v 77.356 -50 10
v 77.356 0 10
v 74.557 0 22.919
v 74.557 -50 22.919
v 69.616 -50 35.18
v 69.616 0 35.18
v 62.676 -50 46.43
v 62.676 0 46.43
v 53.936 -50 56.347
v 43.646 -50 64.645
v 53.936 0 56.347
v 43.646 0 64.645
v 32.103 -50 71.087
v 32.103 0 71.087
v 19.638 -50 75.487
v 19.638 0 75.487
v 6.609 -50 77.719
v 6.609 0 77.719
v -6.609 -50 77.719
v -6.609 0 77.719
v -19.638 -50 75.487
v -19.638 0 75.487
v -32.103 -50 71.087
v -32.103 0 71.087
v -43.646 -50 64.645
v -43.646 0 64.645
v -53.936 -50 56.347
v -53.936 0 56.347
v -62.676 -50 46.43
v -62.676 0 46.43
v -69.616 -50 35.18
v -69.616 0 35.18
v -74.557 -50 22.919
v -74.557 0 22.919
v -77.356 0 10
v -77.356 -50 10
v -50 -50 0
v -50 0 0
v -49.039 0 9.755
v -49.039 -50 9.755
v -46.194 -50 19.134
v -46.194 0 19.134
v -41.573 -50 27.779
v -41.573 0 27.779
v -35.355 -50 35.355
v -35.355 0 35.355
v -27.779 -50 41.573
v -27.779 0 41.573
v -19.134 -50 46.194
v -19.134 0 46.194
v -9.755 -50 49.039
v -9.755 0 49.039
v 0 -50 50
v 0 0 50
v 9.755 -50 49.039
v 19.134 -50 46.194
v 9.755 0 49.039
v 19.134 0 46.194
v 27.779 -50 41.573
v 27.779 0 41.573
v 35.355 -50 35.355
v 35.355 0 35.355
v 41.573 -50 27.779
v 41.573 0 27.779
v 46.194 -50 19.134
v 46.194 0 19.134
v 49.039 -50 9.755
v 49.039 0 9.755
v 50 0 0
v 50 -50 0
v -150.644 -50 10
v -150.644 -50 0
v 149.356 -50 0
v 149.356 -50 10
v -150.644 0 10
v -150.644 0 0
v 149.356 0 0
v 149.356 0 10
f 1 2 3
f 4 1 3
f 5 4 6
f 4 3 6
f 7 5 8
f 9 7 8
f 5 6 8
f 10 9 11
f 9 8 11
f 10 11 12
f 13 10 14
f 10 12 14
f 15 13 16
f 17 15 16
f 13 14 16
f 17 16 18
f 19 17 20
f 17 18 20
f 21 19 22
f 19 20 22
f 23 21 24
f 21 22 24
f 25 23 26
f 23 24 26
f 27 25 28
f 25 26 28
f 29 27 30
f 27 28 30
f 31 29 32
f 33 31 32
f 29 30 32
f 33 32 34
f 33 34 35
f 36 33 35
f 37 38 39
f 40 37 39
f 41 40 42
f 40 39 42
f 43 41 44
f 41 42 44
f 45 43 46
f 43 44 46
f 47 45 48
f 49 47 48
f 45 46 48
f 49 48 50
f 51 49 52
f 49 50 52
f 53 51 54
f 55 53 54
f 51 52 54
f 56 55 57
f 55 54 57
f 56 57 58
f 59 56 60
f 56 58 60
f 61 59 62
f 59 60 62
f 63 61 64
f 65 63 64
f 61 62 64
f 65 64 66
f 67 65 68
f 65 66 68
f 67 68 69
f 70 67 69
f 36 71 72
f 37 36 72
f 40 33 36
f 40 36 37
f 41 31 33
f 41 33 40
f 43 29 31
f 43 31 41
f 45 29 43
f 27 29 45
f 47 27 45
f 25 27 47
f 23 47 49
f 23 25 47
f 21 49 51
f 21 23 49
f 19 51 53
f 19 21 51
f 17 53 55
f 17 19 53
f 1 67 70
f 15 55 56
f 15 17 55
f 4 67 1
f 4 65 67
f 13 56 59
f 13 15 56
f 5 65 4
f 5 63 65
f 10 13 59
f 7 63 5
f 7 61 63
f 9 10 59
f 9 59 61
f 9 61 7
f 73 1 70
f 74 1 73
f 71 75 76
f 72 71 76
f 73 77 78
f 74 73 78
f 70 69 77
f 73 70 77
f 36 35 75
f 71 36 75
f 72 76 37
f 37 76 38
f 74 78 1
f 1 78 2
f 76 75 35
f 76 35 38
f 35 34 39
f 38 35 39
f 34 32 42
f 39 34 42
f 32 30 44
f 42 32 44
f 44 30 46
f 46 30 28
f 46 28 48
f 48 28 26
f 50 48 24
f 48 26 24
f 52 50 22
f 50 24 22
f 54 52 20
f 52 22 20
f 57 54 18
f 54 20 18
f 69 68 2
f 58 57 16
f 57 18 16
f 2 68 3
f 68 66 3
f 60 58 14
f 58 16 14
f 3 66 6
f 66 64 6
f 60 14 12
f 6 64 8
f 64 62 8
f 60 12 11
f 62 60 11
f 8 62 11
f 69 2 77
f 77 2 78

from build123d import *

# Parameters (mm, degrees)
F1_DEPTH = 50


with BuildPart() as f1:
    # F0 (on Front) → F1 (new body)
    with BuildSketch(Plane.XZ):
        with BuildLine():
            Line((-78, 0), (-50, 0))
            ThreePointArc((-50, 0), (0, 50), (50, 0))
            Line((50, 0), (149.356318, 0))
            Line((149.356318, 0), (149.356318, 10))
            Line((149.356318, 10), (77.356318, 10))
            ThreePointArc((77.356318, 10), (0, 78), (-77.356318, 10))
            Line((-77.356318, 10), (-150.643682, 10))
            Line((-150.643682, 10), (-150.643682, 0))
            Line((-150.643682, 0), (-78, 0))
        make_face()
    extrude(amount=F1_DEPTH)


solid = f1.part
